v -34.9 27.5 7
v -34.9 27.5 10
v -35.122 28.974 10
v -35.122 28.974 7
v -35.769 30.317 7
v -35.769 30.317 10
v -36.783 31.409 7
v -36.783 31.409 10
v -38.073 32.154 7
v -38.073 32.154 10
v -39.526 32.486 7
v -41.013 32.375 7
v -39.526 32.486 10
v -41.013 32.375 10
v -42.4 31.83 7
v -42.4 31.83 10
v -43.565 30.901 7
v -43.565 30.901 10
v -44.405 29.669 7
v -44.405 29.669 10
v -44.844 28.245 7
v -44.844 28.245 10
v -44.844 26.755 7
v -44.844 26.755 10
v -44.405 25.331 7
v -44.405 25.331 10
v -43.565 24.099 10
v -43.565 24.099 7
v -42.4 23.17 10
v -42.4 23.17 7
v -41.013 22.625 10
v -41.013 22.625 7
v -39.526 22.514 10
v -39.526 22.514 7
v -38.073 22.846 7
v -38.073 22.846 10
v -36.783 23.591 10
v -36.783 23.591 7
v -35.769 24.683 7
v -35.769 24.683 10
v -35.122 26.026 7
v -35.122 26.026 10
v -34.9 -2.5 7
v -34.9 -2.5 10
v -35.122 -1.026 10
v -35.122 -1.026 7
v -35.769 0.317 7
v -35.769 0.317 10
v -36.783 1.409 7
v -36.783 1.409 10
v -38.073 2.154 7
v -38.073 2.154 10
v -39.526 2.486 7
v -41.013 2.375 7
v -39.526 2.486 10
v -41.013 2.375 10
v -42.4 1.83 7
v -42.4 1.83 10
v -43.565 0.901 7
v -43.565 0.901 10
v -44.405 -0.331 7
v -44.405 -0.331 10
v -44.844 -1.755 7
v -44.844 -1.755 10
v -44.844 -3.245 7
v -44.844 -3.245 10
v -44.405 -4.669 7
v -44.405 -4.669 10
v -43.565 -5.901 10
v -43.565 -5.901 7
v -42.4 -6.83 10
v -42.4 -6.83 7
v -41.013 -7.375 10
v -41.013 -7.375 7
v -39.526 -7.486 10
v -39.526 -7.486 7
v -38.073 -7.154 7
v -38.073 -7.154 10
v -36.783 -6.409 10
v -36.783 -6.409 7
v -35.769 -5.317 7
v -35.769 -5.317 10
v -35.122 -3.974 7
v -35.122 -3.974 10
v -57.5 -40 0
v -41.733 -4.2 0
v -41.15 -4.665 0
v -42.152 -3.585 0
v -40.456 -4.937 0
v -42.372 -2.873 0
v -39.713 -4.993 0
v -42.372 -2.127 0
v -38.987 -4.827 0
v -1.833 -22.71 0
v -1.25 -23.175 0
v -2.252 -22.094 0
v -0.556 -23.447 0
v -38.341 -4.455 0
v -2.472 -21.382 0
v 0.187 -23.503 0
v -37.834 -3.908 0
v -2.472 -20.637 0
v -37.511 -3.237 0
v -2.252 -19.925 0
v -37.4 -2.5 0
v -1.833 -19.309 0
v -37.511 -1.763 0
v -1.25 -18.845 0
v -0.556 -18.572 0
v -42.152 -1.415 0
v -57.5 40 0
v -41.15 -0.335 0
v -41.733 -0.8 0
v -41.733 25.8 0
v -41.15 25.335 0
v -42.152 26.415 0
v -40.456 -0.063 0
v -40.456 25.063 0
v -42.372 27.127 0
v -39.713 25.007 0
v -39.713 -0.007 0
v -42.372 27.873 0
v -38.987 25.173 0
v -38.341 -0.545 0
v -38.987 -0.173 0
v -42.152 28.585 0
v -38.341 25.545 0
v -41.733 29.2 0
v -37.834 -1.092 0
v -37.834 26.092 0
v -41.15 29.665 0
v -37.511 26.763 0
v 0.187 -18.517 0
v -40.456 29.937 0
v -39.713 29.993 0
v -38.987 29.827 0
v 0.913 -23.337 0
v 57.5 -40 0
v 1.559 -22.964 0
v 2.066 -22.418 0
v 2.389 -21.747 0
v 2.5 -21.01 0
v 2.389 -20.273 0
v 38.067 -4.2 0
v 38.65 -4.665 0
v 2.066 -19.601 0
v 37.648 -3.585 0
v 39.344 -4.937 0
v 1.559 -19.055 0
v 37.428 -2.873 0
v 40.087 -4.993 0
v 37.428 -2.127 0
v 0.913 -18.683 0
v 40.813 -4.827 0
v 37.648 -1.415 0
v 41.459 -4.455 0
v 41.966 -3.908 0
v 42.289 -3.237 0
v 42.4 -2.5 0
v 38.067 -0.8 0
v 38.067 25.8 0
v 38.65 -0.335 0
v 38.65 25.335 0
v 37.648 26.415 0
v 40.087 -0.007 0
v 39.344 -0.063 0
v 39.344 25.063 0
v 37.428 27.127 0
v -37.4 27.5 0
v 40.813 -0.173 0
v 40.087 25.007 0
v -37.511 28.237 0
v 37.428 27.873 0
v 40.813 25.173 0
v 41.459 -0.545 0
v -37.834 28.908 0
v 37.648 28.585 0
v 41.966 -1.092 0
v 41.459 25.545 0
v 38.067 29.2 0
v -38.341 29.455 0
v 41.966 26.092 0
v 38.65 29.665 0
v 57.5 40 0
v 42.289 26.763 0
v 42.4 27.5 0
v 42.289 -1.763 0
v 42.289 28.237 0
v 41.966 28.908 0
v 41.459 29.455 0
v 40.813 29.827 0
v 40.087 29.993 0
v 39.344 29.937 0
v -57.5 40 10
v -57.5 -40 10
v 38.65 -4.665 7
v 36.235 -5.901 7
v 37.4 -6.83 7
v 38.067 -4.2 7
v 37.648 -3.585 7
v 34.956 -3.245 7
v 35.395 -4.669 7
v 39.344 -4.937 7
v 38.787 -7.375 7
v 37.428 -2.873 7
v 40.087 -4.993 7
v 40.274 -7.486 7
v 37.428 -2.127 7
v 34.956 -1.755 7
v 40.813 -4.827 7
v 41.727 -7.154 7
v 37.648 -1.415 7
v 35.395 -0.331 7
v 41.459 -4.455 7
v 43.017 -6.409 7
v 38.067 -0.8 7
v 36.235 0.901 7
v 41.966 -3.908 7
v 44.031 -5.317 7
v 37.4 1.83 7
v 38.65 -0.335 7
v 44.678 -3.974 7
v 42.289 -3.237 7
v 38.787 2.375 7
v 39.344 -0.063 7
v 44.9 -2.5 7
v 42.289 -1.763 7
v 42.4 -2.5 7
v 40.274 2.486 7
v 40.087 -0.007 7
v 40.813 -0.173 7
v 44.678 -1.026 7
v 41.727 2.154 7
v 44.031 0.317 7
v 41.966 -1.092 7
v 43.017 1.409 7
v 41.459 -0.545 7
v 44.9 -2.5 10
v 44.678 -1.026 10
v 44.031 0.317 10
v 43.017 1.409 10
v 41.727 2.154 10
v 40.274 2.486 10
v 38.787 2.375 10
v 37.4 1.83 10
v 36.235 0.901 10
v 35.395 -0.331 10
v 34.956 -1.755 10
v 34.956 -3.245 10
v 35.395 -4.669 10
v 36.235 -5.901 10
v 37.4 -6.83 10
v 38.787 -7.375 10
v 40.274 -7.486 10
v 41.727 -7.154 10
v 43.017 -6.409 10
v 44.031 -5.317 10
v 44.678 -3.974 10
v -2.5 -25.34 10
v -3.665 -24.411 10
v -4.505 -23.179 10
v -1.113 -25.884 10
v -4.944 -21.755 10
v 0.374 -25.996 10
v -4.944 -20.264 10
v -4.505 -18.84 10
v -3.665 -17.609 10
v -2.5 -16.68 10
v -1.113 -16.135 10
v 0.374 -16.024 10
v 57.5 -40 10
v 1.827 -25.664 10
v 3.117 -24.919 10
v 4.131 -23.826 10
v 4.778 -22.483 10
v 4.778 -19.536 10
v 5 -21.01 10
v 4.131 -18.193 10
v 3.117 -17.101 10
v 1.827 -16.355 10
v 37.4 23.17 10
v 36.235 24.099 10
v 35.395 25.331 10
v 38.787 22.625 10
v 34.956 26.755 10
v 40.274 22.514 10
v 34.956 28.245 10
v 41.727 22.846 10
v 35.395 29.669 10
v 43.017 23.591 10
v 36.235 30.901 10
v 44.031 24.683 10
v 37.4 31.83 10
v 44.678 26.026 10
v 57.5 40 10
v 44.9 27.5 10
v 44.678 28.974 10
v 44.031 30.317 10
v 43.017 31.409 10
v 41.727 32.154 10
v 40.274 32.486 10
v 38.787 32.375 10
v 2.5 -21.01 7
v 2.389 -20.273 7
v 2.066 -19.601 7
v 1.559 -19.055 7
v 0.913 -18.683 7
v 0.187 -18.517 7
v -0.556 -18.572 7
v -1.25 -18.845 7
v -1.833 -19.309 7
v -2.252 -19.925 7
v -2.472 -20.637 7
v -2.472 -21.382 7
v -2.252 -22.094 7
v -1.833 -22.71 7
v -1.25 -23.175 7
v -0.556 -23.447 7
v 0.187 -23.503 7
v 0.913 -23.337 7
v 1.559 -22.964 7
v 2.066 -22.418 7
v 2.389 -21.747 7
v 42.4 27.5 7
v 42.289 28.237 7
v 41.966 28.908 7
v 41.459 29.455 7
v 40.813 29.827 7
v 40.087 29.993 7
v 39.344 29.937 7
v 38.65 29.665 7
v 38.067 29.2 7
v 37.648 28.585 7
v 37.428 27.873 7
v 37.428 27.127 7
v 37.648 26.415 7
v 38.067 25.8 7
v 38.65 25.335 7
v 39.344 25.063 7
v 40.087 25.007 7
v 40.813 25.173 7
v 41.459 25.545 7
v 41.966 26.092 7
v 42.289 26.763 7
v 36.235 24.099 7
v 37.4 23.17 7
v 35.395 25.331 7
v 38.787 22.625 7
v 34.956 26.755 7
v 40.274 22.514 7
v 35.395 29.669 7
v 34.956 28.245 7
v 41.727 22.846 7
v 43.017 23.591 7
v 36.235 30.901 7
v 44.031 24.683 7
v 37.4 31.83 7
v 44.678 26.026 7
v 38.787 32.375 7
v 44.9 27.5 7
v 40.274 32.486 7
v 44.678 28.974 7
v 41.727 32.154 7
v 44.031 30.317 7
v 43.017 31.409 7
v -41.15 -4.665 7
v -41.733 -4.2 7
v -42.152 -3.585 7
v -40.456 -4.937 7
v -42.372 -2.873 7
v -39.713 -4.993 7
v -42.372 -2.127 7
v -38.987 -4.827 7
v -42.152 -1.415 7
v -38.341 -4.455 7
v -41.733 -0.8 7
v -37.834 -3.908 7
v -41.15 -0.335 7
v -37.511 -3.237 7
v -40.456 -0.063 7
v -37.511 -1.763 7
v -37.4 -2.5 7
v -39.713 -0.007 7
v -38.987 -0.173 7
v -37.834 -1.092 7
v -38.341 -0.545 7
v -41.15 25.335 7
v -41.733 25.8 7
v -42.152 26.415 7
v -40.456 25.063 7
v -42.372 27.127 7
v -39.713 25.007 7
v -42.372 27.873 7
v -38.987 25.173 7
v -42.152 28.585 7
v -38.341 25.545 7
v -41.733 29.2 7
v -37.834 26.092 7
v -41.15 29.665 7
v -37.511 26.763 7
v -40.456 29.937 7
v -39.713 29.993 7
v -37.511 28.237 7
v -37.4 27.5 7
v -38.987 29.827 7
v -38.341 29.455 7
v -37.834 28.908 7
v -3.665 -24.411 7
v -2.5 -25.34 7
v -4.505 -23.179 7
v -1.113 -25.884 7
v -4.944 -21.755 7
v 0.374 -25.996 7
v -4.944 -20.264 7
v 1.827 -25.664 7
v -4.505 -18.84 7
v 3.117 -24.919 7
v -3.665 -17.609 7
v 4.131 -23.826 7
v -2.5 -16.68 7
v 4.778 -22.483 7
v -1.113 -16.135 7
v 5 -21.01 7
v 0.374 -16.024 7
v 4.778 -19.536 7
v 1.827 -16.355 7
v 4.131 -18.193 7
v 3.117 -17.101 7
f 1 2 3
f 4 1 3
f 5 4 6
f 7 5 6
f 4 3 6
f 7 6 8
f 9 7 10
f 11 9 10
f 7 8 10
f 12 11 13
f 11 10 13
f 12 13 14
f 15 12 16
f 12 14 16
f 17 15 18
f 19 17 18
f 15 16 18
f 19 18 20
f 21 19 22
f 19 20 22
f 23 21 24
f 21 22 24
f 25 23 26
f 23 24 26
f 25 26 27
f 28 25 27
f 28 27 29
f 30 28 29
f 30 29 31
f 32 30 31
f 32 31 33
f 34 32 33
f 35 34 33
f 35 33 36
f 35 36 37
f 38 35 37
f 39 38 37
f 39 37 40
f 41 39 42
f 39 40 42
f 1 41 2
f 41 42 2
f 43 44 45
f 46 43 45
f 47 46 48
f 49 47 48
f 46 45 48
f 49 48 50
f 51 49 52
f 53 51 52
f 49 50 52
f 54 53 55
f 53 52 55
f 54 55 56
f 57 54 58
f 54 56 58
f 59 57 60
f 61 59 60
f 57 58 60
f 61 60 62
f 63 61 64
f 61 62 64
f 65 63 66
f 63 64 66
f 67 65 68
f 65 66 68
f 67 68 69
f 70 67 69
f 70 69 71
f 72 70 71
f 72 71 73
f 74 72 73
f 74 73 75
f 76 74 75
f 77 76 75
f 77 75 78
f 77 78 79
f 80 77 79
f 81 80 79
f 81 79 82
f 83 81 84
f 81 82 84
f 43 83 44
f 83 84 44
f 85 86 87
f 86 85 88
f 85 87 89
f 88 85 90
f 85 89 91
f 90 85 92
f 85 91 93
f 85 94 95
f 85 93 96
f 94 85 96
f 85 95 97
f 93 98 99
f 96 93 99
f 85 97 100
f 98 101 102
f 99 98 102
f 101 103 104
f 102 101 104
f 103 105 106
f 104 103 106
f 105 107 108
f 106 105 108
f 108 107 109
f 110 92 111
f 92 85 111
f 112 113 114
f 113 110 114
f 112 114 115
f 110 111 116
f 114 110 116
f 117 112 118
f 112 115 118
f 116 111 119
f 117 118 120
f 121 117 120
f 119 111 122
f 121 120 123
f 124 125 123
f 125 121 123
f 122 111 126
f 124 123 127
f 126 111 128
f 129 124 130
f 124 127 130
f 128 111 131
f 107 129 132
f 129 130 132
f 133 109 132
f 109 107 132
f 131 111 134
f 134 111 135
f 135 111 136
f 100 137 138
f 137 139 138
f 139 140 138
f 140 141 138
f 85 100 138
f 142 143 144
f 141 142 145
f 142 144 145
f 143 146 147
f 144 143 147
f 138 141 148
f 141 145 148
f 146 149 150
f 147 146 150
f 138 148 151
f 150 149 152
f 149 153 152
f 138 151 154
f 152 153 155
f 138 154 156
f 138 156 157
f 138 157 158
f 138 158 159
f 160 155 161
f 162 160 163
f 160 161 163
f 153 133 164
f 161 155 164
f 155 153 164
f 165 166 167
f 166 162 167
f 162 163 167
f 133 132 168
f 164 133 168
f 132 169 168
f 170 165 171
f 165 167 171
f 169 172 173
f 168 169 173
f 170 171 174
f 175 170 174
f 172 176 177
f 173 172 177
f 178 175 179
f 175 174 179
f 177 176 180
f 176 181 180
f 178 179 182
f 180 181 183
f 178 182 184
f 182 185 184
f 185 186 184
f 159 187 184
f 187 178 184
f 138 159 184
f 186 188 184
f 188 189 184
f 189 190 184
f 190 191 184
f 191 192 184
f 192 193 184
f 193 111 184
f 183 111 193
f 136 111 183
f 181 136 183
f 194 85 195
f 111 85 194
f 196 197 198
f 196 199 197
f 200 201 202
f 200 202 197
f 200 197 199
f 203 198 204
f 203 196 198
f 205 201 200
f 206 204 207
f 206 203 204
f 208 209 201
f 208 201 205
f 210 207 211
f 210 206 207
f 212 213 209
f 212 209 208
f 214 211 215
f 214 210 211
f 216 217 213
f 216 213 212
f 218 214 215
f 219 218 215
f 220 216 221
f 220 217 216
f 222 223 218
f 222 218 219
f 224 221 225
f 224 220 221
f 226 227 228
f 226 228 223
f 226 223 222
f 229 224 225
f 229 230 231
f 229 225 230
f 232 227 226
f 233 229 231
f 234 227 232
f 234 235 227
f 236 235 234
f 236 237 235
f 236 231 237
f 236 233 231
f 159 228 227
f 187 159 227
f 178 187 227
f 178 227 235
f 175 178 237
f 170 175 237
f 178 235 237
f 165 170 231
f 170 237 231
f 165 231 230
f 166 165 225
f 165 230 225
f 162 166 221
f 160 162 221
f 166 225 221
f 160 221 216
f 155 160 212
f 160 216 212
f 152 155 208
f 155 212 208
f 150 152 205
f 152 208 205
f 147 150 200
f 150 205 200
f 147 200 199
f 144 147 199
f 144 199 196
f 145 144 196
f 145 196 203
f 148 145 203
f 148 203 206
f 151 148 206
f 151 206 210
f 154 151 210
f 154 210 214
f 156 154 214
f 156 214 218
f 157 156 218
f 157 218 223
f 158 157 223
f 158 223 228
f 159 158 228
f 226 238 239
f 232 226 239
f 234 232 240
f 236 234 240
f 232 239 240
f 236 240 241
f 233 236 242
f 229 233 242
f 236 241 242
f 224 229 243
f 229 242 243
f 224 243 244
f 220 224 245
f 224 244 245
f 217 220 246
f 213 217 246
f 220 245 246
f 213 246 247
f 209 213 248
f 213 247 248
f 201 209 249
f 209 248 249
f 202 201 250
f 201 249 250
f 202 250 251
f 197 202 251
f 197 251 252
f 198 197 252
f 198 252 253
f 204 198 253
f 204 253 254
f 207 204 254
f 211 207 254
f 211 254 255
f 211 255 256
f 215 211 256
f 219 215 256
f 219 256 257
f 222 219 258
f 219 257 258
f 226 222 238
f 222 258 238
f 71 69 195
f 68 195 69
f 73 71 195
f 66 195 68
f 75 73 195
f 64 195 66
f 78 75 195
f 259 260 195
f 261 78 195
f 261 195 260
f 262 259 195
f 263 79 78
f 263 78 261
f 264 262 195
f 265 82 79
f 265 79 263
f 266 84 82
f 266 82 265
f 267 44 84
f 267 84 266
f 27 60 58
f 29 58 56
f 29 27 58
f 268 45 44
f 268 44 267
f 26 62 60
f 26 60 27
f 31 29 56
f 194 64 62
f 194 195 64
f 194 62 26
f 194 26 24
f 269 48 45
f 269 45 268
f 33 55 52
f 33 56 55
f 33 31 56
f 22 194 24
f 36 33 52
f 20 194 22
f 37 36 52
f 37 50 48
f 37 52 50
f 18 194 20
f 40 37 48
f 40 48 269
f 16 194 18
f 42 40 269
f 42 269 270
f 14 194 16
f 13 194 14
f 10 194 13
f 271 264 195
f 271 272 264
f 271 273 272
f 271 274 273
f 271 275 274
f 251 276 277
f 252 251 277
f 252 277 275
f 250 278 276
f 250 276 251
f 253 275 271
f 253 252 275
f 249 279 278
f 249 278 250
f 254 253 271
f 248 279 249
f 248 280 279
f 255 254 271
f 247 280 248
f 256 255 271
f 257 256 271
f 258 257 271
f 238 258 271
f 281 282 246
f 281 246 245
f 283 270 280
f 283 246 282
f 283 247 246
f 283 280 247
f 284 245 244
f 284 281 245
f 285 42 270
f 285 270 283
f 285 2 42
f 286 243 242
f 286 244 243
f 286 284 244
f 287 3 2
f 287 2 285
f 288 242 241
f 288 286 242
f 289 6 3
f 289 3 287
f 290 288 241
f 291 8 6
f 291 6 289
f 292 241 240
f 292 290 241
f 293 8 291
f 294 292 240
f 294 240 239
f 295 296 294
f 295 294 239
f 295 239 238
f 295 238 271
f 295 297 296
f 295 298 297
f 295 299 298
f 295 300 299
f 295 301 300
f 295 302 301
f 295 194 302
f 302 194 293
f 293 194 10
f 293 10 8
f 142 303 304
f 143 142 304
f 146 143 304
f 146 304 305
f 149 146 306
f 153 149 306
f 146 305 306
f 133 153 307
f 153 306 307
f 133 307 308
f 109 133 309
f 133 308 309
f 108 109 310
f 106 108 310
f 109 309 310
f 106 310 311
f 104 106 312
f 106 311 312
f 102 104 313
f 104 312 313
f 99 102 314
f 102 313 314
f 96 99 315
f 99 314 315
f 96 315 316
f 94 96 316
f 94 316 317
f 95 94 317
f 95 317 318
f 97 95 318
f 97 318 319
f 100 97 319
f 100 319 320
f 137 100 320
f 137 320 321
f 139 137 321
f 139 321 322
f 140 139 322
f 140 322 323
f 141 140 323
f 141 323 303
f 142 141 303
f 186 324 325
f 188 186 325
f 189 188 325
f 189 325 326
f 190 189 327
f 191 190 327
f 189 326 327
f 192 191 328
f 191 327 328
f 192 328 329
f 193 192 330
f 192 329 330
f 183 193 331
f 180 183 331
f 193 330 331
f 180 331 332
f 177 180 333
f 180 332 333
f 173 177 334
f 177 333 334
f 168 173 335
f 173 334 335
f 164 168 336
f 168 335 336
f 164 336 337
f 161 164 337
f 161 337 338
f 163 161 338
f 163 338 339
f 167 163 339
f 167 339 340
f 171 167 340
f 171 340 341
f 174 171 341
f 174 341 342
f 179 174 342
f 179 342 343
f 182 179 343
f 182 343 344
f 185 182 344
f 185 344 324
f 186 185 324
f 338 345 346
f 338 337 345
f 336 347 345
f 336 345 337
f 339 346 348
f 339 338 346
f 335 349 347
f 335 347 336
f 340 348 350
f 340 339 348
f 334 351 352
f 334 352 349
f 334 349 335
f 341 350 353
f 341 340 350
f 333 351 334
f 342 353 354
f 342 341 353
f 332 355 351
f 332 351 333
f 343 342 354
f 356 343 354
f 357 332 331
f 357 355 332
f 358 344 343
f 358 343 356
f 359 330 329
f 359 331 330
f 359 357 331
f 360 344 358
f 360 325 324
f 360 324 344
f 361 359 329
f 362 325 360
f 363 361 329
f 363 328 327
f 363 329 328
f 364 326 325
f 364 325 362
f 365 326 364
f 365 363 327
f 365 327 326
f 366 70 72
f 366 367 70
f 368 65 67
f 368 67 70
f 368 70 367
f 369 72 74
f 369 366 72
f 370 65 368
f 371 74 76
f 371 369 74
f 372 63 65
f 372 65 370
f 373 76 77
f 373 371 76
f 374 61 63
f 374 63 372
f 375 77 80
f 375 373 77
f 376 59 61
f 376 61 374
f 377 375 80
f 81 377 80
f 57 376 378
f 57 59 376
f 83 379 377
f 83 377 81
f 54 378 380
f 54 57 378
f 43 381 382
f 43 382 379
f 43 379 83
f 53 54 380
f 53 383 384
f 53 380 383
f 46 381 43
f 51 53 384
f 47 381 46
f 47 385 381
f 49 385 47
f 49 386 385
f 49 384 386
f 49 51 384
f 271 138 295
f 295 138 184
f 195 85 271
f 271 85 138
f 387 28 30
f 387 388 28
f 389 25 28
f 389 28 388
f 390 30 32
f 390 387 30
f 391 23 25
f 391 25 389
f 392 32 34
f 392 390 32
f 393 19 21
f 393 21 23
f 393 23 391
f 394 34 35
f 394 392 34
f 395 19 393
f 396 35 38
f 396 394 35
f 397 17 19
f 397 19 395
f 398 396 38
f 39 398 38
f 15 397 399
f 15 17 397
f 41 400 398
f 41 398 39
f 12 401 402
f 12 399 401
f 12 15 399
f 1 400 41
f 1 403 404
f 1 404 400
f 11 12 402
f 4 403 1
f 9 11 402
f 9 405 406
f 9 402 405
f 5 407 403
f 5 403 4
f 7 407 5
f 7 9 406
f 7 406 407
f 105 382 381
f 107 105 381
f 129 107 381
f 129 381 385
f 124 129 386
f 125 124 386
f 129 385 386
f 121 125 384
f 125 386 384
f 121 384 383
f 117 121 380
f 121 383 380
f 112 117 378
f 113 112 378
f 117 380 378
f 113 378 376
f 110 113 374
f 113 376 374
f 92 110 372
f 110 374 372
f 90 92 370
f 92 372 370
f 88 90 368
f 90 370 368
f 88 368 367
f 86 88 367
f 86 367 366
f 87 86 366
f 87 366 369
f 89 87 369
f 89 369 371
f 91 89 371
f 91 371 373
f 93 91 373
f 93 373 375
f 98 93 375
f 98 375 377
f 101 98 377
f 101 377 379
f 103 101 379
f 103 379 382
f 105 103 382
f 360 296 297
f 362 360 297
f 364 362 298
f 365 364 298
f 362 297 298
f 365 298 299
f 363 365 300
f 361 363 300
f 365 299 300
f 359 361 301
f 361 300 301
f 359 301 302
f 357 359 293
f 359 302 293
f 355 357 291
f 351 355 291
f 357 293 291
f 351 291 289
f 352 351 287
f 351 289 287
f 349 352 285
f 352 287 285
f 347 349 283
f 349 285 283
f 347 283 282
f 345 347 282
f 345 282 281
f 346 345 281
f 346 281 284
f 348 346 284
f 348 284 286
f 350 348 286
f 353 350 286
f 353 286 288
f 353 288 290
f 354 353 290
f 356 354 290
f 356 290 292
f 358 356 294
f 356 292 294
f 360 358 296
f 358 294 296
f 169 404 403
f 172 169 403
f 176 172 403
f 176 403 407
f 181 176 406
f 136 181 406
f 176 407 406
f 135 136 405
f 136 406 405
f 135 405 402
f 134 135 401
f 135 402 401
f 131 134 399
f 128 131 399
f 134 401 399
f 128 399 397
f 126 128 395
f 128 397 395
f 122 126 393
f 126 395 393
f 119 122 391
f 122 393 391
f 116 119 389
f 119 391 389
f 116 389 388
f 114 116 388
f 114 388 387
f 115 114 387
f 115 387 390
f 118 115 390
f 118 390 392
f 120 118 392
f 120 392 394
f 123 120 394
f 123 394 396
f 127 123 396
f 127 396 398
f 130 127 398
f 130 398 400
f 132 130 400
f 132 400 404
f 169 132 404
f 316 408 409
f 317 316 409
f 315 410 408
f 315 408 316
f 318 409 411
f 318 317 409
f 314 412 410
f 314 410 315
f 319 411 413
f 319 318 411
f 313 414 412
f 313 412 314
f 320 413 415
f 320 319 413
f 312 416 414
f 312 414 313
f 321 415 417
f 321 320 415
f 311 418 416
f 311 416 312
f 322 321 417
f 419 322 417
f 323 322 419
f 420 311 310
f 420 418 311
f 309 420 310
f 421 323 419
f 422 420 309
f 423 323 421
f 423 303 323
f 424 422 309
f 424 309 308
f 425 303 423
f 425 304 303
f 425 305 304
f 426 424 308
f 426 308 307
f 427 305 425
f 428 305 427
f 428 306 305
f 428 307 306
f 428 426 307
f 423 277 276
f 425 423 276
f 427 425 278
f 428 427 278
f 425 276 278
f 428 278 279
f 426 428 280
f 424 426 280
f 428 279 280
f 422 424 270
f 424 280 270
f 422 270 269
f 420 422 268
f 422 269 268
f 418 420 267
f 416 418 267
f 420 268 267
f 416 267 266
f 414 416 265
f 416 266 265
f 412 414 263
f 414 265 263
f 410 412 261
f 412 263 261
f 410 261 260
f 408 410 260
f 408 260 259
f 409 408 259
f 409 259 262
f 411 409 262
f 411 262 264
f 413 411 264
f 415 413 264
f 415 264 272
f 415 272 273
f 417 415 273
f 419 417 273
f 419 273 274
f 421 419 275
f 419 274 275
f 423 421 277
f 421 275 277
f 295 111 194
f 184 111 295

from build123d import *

# Parameters (mm, degrees)
SKETCH1_W            = 115
SKETCH1_H            = 80
BOSS_EXTRUDE1_DEPTH  = 10
SKETCH2_R            = 2.5
CUT_EXTRUDE1_DEPTH   = 10
LPATTERN1_COUNT      = 2
LPATTERN1_PITCH      = 79.8
LPATTERN1_COUNT_DIR2 = 2
LPATTERN1_PITCH_DIR2 = 30
SKETCH4_R            = 5
CUT_EXTRUDE2_DEPTH   = 3
LPATTERN2_COUNT      = 2
LPATTERN2_PITCH      = 79.8
LPATTERN2_COUNT_DIR2 = 2
LPATTERN2_PITCH_DIR2 = 30
SKETCH5_R            = 2.5
CUT_EXTRUDE3_DEPTH   = 11
SKETCH6_R            = 5
CUT_EXTRUDE4_DEPTH   = 3


with BuildPart() as part:
    # Sketch1 → Boss-Extrude1 (new body)
    with BuildSketch(Plane.XY):
        Rectangle(SKETCH1_W, SKETCH1_H)
    extrude(amount=BOSS_EXTRUDE1_DEPTH)

    # Sketch2 → Cut-Extrude1 (cut)
    with BuildSketch(Plane.XY.offset(10)):
        with Locations((-39.9, 27.5)):
            Circle(SKETCH2_R)
    cut_extrude1 = extrude(amount=-CUT_EXTRUDE1_DEPTH, mode=Mode.SUBTRACT)

    # LPattern1: Cut-Extrude1 2 × 2
    with Locations(*[(i * LPATTERN1_PITCH, -j * LPATTERN1_PITCH_DIR2, 0) for i in range(LPATTERN1_COUNT) for j in range(LPATTERN1_COUNT_DIR2) if (i, j) != (0, 0)]):
        add(cut_extrude1, mode=Mode.SUBTRACT)

    # Sketch4 → Cut-Extrude2 (cut)
    with BuildSketch(Plane.XY.offset(10)):
        with Locations((-39.9, 27.5)):
            Circle(SKETCH4_R)
    cut_extrude2 = extrude(amount=-CUT_EXTRUDE2_DEPTH, mode=Mode.SUBTRACT)

    # LPattern2: Cut-Extrude2 2 × 2
    with Locations(*[(i * LPATTERN2_PITCH, -j * LPATTERN2_PITCH_DIR2, 0) for i in range(LPATTERN2_COUNT) for j in range(LPATTERN2_COUNT_DIR2) if (i, j) != (0, 0)]):
        add(cut_extrude2, mode=Mode.SUBTRACT)

    # Sketch5 → Cut-Extrude3 (cut, through all)
    with BuildSketch(Plane.XY.offset(10)):
        with Locations((0, -21.009684694)):
            Circle(SKETCH5_R)
    extrude(amount=-CUT_EXTRUDE3_DEPTH, mode=Mode.SUBTRACT)

    # Sketch6 → Cut-Extrude4 (cut)
    with BuildSketch(Plane.XY.offset(10)):
        with Locations((0, -21.009684694)):
            Circle(SKETCH6_R)
    extrude(amount=-CUT_EXTRUDE4_DEPTH, mode=Mode.SUBTRACT)


solid = part.part
